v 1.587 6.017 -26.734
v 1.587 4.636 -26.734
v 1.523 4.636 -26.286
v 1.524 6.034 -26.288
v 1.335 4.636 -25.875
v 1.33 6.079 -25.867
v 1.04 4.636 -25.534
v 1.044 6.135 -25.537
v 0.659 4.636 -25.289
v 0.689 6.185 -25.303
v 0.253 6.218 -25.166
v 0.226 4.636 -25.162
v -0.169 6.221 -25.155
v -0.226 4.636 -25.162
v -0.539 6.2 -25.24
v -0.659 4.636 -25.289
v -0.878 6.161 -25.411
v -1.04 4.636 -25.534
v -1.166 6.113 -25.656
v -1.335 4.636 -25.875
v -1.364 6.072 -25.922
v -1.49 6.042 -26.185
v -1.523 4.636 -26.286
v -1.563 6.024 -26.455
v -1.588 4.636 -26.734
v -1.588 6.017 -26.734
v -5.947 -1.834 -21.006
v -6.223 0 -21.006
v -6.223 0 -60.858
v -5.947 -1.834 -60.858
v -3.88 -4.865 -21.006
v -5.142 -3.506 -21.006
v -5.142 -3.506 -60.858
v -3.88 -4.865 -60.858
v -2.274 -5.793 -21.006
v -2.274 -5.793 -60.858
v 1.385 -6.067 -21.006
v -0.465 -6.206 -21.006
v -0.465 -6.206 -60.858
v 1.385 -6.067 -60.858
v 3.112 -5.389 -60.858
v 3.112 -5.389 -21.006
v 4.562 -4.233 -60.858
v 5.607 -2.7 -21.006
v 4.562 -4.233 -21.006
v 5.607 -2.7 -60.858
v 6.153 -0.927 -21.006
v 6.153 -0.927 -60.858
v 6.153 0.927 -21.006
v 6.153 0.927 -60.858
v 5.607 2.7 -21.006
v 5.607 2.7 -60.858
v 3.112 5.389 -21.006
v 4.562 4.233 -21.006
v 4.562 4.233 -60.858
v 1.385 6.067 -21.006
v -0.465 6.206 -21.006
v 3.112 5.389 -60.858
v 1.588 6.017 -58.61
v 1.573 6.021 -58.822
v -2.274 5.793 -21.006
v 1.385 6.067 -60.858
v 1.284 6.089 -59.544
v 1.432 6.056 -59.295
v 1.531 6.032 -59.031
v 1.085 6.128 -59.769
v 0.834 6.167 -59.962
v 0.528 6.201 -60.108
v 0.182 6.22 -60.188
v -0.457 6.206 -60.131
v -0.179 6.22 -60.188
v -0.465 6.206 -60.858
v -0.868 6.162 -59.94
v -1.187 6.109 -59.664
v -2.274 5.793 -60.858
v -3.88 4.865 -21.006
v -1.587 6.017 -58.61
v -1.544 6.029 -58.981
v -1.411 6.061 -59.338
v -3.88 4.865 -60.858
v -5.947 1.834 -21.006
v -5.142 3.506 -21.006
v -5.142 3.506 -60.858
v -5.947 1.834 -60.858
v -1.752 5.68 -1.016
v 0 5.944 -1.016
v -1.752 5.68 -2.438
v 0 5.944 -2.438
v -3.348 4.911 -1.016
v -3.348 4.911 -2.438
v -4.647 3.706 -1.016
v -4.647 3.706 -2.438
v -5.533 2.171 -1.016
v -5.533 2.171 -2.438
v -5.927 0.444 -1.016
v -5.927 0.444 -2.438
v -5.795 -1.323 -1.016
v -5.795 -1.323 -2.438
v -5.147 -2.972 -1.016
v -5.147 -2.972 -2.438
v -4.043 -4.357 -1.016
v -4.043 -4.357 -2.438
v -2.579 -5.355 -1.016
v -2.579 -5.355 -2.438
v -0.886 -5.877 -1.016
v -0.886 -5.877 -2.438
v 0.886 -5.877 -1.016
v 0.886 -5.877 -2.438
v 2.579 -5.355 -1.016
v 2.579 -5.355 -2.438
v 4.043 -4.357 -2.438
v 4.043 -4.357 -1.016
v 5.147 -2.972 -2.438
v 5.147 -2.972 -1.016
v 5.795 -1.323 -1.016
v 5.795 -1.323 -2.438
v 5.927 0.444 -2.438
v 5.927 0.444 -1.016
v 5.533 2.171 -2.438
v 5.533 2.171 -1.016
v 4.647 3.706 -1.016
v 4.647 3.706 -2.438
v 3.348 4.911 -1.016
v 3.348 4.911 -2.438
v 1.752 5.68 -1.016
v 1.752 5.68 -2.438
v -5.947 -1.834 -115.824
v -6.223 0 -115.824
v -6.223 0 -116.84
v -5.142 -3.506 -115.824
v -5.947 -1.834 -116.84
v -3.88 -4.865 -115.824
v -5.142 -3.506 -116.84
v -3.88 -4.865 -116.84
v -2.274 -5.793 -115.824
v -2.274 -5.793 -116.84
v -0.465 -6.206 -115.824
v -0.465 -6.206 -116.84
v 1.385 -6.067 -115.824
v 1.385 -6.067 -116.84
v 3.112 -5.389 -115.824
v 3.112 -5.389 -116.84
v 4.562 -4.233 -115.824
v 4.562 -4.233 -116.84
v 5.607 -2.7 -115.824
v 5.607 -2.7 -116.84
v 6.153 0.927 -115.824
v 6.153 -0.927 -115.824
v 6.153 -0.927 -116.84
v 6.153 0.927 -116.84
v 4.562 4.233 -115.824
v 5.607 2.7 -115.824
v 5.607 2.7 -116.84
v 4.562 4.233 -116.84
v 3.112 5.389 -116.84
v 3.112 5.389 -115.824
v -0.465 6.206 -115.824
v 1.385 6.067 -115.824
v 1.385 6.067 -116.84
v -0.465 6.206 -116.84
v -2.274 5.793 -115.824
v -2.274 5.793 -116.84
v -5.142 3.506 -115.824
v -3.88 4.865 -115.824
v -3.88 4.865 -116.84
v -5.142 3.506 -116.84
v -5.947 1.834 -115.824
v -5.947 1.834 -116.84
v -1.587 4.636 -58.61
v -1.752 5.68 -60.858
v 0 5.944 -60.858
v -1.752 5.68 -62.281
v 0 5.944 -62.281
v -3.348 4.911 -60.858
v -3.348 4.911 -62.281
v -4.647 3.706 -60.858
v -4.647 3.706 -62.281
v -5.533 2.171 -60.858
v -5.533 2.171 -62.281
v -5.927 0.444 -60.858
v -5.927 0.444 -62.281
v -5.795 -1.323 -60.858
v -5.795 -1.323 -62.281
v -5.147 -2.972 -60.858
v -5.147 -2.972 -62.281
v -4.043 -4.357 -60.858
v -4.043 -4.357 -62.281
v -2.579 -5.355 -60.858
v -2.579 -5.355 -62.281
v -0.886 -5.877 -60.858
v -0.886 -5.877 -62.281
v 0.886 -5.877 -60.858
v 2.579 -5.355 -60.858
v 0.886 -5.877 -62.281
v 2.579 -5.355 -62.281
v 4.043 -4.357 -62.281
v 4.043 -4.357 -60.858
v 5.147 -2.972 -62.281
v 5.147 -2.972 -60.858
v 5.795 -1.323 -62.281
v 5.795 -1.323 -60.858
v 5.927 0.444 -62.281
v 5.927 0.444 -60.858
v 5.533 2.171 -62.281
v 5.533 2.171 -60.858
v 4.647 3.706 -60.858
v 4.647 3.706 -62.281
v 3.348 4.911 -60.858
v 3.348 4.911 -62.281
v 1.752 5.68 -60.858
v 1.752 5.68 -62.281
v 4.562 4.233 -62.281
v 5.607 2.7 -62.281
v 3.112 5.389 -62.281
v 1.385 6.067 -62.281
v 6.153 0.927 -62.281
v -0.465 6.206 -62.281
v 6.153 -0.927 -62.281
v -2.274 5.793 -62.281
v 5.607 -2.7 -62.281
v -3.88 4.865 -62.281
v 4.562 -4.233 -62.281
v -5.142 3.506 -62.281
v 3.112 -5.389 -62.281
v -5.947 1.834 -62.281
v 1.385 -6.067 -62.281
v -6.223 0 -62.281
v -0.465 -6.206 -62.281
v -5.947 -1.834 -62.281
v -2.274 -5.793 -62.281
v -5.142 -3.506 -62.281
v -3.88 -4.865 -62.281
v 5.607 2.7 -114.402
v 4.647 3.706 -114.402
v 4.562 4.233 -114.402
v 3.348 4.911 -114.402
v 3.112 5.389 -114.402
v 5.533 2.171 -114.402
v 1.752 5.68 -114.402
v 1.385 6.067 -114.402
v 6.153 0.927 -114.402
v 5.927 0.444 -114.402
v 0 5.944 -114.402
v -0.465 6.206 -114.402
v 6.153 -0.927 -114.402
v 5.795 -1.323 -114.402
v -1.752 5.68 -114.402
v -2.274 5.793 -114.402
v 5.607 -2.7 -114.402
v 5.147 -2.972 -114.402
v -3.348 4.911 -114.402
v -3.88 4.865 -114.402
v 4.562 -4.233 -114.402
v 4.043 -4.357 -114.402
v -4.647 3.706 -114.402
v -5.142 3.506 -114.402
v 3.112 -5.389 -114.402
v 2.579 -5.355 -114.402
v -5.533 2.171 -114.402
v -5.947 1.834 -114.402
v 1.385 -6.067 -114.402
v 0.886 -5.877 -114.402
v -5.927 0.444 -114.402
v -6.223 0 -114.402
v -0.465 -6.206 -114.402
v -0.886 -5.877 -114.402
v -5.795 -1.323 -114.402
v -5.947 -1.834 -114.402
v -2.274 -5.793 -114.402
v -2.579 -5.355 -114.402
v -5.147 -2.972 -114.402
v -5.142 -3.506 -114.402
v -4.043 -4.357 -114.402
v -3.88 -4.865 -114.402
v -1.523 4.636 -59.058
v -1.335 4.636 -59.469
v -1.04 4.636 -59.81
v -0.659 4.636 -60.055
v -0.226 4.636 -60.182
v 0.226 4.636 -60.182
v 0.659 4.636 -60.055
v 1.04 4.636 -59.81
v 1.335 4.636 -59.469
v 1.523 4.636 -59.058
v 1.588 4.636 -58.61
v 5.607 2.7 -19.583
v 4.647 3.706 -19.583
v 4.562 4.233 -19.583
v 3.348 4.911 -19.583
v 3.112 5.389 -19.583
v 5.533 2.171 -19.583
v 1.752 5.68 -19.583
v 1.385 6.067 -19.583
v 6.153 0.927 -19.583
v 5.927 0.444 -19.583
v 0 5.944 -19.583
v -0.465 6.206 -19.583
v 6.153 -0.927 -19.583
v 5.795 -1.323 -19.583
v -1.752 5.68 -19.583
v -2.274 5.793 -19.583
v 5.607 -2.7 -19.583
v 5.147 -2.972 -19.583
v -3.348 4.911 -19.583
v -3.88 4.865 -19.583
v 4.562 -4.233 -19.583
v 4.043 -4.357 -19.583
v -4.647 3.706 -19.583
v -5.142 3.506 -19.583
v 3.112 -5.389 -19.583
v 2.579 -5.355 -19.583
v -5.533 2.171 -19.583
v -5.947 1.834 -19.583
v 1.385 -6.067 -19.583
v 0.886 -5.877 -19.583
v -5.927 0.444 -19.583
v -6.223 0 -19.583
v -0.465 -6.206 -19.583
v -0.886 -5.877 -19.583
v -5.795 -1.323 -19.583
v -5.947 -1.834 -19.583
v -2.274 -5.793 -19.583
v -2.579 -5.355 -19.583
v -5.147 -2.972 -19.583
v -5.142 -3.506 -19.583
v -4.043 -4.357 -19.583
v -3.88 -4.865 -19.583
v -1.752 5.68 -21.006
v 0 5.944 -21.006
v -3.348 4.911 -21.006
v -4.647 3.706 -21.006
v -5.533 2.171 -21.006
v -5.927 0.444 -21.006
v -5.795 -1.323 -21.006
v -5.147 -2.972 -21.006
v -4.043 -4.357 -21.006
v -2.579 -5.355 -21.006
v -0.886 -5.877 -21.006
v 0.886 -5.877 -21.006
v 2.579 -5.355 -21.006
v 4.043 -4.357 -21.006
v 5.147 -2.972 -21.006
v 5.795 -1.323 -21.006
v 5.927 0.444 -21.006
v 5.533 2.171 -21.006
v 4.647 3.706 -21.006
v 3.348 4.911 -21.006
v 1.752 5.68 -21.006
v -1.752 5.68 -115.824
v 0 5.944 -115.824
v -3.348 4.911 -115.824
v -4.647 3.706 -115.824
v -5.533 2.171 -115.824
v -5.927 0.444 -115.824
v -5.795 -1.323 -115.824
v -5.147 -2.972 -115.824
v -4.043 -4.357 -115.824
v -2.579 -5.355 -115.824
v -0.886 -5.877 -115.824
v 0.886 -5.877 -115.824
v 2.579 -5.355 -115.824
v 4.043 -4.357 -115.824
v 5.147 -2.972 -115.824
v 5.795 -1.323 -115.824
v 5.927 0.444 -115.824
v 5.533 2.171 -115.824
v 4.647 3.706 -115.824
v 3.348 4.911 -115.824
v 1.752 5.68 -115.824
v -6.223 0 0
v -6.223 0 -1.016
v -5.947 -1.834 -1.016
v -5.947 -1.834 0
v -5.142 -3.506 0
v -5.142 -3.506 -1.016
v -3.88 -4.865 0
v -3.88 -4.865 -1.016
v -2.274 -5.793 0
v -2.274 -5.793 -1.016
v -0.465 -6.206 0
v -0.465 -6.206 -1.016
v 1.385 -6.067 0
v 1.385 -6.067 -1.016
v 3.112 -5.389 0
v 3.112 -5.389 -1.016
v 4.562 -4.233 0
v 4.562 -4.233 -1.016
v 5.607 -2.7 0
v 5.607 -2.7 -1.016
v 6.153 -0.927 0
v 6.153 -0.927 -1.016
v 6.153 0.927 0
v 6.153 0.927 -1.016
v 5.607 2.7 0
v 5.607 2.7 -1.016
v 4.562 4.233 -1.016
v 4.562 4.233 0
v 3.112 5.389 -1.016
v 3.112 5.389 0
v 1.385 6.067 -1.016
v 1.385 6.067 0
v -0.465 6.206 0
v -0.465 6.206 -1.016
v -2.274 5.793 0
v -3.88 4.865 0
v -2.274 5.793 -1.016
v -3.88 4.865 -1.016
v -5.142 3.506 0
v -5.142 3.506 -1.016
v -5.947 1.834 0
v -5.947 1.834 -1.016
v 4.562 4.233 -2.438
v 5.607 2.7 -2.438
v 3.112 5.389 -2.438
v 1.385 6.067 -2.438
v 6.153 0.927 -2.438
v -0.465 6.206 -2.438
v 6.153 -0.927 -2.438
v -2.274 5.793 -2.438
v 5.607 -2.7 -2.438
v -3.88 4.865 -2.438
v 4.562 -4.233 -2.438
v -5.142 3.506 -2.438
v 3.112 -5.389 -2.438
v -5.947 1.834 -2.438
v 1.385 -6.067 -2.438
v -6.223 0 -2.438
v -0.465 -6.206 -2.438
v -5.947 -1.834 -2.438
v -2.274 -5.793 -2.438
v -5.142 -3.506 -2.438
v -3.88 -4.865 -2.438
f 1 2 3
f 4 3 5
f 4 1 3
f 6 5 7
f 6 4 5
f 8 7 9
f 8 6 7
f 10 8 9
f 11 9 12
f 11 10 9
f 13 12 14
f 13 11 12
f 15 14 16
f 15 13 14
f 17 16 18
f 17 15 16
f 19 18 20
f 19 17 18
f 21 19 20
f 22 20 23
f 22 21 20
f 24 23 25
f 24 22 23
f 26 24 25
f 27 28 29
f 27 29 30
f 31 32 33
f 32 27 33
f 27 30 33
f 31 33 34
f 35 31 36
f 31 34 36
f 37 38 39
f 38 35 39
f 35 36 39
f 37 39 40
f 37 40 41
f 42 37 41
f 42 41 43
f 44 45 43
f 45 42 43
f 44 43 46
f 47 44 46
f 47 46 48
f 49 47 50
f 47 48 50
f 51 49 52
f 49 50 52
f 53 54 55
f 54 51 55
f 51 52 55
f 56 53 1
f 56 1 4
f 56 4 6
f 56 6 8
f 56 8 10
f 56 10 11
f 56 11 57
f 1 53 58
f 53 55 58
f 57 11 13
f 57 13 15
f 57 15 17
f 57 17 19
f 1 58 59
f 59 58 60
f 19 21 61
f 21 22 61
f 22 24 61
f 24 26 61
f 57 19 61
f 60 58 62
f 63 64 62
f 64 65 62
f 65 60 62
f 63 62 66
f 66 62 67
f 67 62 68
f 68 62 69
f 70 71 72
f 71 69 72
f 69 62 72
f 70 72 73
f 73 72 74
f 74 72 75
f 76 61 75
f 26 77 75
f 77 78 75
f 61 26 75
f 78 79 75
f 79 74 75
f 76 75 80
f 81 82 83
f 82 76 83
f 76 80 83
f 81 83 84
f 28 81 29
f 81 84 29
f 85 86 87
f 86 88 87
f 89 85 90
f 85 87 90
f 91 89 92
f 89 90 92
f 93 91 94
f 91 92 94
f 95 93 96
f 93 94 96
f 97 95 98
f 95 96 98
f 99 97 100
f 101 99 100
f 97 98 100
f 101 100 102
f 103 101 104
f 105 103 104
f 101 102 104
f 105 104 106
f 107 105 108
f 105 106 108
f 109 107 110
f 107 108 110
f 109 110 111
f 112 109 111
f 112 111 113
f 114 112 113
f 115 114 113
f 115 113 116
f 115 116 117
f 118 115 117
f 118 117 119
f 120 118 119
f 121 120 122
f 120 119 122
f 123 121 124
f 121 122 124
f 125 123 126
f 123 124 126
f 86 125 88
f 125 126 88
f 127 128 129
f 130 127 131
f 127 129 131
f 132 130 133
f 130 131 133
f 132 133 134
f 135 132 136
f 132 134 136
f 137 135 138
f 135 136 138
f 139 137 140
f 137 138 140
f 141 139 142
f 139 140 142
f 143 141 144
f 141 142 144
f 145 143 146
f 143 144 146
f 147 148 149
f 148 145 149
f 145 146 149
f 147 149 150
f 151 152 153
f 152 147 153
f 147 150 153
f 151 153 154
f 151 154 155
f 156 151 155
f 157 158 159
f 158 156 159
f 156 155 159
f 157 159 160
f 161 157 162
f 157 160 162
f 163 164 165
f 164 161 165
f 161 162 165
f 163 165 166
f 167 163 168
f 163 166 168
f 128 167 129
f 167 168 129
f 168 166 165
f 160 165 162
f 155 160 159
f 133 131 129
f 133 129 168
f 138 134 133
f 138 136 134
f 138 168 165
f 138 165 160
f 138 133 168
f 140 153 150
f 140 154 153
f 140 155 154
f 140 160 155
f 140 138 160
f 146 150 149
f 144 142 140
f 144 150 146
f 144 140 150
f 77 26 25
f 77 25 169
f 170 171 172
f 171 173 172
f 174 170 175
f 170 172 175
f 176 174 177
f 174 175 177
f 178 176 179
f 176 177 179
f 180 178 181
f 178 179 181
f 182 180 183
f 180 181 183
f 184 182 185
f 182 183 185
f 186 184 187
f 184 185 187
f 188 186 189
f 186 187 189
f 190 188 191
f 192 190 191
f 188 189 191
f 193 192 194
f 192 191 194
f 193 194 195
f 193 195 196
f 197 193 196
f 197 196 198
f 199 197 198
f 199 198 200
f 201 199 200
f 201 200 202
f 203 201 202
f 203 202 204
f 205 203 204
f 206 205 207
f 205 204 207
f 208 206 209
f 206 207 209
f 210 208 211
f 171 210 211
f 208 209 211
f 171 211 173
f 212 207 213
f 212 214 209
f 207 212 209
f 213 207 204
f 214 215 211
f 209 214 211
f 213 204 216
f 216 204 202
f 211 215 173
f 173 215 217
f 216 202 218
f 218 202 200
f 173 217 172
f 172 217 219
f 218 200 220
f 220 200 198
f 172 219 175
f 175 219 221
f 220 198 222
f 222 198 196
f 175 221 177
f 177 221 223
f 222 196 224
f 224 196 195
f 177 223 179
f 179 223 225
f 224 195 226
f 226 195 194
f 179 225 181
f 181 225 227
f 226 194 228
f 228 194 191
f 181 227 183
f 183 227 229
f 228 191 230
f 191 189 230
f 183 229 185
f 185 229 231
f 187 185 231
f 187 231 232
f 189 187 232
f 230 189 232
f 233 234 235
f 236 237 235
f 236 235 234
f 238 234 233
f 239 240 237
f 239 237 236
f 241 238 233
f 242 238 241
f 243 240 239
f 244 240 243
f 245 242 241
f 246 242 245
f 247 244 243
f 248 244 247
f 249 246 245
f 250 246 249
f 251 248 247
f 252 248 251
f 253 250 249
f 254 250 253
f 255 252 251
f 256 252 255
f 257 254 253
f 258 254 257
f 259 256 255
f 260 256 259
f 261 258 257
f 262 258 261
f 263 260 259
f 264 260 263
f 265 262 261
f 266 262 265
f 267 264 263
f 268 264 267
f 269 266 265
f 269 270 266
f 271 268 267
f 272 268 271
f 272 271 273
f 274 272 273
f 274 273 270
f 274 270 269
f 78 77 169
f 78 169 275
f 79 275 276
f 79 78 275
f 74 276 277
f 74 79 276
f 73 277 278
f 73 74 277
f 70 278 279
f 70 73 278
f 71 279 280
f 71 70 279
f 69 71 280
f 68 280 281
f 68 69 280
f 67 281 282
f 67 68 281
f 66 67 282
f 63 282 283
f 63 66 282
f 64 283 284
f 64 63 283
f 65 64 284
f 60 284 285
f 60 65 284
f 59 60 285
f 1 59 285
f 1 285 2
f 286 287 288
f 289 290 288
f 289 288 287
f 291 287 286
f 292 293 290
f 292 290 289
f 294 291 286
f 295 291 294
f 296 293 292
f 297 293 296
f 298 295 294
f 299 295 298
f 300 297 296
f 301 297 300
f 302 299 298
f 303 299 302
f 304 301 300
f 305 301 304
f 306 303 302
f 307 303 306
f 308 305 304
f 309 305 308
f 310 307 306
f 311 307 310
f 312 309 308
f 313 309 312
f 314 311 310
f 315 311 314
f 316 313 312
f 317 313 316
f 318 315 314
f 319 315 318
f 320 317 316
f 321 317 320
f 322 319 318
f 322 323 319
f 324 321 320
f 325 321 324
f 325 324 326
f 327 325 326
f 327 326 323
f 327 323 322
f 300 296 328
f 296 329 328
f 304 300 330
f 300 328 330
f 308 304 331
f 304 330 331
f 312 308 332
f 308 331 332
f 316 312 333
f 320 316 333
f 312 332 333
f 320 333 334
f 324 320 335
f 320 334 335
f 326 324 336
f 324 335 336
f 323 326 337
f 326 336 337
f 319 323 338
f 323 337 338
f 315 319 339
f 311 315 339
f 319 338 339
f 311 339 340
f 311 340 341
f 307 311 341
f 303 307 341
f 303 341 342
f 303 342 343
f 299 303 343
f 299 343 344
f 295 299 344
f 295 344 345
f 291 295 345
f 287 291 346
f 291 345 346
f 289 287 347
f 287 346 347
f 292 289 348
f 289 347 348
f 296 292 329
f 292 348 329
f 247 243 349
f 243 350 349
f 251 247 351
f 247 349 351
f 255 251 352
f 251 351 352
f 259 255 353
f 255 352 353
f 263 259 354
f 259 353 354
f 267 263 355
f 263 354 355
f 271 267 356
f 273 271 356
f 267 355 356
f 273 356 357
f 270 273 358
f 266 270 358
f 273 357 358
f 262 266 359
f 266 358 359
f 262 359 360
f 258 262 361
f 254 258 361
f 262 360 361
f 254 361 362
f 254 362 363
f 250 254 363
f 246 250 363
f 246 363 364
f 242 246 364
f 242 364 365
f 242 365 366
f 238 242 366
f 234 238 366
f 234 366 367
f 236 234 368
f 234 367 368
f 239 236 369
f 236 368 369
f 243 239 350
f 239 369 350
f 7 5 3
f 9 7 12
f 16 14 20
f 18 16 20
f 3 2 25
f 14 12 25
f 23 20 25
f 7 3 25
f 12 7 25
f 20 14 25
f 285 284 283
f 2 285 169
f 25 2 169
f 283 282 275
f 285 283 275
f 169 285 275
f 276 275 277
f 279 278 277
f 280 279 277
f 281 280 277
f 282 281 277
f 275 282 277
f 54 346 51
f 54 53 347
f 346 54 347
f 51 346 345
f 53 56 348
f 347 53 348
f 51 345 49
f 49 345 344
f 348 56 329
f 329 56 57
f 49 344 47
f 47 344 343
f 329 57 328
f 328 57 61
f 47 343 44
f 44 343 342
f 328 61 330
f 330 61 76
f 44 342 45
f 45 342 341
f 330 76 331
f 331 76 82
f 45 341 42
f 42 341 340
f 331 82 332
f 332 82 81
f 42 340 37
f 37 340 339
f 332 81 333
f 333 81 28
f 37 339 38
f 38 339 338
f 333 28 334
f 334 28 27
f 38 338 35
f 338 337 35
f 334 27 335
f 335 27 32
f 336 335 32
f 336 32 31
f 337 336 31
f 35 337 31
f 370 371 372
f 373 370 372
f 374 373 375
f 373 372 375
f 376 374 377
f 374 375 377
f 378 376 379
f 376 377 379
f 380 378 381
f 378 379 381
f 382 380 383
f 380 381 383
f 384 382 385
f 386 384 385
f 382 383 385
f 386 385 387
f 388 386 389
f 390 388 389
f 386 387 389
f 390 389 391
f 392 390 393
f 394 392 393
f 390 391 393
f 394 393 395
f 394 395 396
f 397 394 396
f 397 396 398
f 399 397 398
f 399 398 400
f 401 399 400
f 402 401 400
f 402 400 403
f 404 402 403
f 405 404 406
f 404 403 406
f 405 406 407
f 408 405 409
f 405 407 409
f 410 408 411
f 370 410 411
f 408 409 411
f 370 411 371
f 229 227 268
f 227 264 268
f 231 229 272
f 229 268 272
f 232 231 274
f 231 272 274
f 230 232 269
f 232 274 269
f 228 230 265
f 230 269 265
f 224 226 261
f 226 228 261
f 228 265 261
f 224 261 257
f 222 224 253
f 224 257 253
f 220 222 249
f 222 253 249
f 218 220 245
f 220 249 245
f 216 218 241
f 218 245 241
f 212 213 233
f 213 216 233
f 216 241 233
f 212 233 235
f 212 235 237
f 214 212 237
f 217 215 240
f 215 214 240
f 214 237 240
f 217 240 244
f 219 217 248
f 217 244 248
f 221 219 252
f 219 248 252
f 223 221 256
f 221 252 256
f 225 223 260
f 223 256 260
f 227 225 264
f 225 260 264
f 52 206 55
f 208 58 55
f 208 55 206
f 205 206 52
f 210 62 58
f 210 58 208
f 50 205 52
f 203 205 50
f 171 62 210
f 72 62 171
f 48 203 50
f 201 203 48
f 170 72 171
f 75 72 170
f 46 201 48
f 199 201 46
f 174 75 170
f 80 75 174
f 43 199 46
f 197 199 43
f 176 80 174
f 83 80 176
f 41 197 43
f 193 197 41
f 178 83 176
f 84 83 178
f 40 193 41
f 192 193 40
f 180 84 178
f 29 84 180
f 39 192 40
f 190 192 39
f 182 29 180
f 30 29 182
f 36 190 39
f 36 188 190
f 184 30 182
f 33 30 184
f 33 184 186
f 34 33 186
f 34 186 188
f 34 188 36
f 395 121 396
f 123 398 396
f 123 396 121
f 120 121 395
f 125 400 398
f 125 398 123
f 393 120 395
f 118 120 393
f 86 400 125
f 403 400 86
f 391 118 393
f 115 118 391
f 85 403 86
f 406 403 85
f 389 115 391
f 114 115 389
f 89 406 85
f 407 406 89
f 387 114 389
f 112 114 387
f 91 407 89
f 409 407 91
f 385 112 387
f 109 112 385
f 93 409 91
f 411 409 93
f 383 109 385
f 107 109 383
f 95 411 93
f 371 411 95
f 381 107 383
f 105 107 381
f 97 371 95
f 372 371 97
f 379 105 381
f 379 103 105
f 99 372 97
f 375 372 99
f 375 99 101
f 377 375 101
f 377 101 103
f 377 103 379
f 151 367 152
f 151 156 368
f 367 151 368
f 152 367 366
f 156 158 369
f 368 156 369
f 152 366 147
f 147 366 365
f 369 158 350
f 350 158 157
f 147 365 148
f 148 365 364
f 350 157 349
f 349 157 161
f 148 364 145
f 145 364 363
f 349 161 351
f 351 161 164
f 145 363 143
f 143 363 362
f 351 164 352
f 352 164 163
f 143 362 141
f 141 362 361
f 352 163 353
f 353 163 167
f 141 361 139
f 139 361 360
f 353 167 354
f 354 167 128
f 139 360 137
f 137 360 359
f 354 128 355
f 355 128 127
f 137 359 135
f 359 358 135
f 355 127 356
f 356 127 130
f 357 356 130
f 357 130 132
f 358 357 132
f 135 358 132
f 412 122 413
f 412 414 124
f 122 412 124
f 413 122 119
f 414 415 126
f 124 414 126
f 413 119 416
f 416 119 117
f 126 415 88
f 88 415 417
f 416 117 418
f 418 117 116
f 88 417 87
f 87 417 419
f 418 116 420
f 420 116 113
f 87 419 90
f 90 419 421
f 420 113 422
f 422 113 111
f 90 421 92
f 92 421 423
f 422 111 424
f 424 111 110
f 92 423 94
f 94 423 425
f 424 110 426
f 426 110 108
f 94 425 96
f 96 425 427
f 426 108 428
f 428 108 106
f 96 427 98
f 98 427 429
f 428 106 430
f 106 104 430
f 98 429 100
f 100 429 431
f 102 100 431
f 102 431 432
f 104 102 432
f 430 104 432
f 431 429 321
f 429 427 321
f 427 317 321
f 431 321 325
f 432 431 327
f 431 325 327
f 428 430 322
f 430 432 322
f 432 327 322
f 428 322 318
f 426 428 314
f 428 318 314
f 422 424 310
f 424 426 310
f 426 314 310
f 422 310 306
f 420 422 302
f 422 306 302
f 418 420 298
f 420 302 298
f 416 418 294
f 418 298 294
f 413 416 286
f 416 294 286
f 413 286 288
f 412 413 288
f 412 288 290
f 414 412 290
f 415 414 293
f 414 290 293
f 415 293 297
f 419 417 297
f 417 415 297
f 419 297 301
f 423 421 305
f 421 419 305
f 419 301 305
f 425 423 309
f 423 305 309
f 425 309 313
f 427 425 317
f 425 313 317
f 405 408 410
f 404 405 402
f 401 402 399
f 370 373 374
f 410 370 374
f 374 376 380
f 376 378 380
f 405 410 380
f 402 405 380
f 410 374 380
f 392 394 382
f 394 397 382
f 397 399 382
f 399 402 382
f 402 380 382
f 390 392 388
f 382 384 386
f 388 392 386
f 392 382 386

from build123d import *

# Parameters (mm, degrees)
SKETCH1_W          = 116.84
SKETCH1_H          = 6.223
SKETCH3_W          = 1.4224
SKETCH3_H          = 0.5588
CUT_EXTRUDE1_DEPTH = 1.5875


with BuildPart() as part:
    # Sketch1 → Revolve1 (revolve)
    with BuildSketch(Plane(origin=(0, 0, 0), x_dir=(0, 0, -1), z_dir=(1, 0, 0))):
        with Locations((58.42, 3.1115)):
            Rectangle(SKETCH1_W, SKETCH1_H)
    revolve(axis=Axis((0, 0, 0), (0, 0, 1)))

    # Sketch3 → Cut-Revolve1 (revolve, cut)
    with BuildSketch(Plane(origin=(0, 0, 0), x_dir=(0, 0, -1), z_dir=(1, 0, 0))):
        with Locations((1.7272, 6.223)):
            Rectangle(SKETCH3_W, SKETCH3_H)
        with Locations((61.5696, 6.223)):
            Rectangle(SKETCH3_W, SKETCH3_H)
        with Locations((20.2946, 6.223)):
            Rectangle(SKETCH3_W, SKETCH3_H)
        with Locations((115.1128, 6.223)):
            Rectangle(SKETCH3_W, SKETCH3_H)
    revolve(axis=Axis((0, 0, 0), (0, 0, 1)), mode=Mode.SUBTRACT)

    # Sketch4 → Cut-Extrude1 (cut)
    with BuildSketch(Plane(origin=(0, 6.223, 0), x_dir=(1, 0, 0), z_dir=(0, 1, 0))):
        with BuildLine():
            Line((-1.5875, 26.7335), (-1.5875, 58.6105))
            ThreePointArc((-1.5875, 58.6105), (0, 60.198), (1.5875, 58.6105))
            Line((1.5875, 58.6105), (1.5875, 26.7335))
            ThreePointArc((1.5875, 26.7335), (0, 25.146), (-1.5875, 26.7335))
        make_face()
    extrude(amount=-CUT_EXTRUDE1_DEPTH, mode=Mode.SUBTRACT)


solid = part.part
